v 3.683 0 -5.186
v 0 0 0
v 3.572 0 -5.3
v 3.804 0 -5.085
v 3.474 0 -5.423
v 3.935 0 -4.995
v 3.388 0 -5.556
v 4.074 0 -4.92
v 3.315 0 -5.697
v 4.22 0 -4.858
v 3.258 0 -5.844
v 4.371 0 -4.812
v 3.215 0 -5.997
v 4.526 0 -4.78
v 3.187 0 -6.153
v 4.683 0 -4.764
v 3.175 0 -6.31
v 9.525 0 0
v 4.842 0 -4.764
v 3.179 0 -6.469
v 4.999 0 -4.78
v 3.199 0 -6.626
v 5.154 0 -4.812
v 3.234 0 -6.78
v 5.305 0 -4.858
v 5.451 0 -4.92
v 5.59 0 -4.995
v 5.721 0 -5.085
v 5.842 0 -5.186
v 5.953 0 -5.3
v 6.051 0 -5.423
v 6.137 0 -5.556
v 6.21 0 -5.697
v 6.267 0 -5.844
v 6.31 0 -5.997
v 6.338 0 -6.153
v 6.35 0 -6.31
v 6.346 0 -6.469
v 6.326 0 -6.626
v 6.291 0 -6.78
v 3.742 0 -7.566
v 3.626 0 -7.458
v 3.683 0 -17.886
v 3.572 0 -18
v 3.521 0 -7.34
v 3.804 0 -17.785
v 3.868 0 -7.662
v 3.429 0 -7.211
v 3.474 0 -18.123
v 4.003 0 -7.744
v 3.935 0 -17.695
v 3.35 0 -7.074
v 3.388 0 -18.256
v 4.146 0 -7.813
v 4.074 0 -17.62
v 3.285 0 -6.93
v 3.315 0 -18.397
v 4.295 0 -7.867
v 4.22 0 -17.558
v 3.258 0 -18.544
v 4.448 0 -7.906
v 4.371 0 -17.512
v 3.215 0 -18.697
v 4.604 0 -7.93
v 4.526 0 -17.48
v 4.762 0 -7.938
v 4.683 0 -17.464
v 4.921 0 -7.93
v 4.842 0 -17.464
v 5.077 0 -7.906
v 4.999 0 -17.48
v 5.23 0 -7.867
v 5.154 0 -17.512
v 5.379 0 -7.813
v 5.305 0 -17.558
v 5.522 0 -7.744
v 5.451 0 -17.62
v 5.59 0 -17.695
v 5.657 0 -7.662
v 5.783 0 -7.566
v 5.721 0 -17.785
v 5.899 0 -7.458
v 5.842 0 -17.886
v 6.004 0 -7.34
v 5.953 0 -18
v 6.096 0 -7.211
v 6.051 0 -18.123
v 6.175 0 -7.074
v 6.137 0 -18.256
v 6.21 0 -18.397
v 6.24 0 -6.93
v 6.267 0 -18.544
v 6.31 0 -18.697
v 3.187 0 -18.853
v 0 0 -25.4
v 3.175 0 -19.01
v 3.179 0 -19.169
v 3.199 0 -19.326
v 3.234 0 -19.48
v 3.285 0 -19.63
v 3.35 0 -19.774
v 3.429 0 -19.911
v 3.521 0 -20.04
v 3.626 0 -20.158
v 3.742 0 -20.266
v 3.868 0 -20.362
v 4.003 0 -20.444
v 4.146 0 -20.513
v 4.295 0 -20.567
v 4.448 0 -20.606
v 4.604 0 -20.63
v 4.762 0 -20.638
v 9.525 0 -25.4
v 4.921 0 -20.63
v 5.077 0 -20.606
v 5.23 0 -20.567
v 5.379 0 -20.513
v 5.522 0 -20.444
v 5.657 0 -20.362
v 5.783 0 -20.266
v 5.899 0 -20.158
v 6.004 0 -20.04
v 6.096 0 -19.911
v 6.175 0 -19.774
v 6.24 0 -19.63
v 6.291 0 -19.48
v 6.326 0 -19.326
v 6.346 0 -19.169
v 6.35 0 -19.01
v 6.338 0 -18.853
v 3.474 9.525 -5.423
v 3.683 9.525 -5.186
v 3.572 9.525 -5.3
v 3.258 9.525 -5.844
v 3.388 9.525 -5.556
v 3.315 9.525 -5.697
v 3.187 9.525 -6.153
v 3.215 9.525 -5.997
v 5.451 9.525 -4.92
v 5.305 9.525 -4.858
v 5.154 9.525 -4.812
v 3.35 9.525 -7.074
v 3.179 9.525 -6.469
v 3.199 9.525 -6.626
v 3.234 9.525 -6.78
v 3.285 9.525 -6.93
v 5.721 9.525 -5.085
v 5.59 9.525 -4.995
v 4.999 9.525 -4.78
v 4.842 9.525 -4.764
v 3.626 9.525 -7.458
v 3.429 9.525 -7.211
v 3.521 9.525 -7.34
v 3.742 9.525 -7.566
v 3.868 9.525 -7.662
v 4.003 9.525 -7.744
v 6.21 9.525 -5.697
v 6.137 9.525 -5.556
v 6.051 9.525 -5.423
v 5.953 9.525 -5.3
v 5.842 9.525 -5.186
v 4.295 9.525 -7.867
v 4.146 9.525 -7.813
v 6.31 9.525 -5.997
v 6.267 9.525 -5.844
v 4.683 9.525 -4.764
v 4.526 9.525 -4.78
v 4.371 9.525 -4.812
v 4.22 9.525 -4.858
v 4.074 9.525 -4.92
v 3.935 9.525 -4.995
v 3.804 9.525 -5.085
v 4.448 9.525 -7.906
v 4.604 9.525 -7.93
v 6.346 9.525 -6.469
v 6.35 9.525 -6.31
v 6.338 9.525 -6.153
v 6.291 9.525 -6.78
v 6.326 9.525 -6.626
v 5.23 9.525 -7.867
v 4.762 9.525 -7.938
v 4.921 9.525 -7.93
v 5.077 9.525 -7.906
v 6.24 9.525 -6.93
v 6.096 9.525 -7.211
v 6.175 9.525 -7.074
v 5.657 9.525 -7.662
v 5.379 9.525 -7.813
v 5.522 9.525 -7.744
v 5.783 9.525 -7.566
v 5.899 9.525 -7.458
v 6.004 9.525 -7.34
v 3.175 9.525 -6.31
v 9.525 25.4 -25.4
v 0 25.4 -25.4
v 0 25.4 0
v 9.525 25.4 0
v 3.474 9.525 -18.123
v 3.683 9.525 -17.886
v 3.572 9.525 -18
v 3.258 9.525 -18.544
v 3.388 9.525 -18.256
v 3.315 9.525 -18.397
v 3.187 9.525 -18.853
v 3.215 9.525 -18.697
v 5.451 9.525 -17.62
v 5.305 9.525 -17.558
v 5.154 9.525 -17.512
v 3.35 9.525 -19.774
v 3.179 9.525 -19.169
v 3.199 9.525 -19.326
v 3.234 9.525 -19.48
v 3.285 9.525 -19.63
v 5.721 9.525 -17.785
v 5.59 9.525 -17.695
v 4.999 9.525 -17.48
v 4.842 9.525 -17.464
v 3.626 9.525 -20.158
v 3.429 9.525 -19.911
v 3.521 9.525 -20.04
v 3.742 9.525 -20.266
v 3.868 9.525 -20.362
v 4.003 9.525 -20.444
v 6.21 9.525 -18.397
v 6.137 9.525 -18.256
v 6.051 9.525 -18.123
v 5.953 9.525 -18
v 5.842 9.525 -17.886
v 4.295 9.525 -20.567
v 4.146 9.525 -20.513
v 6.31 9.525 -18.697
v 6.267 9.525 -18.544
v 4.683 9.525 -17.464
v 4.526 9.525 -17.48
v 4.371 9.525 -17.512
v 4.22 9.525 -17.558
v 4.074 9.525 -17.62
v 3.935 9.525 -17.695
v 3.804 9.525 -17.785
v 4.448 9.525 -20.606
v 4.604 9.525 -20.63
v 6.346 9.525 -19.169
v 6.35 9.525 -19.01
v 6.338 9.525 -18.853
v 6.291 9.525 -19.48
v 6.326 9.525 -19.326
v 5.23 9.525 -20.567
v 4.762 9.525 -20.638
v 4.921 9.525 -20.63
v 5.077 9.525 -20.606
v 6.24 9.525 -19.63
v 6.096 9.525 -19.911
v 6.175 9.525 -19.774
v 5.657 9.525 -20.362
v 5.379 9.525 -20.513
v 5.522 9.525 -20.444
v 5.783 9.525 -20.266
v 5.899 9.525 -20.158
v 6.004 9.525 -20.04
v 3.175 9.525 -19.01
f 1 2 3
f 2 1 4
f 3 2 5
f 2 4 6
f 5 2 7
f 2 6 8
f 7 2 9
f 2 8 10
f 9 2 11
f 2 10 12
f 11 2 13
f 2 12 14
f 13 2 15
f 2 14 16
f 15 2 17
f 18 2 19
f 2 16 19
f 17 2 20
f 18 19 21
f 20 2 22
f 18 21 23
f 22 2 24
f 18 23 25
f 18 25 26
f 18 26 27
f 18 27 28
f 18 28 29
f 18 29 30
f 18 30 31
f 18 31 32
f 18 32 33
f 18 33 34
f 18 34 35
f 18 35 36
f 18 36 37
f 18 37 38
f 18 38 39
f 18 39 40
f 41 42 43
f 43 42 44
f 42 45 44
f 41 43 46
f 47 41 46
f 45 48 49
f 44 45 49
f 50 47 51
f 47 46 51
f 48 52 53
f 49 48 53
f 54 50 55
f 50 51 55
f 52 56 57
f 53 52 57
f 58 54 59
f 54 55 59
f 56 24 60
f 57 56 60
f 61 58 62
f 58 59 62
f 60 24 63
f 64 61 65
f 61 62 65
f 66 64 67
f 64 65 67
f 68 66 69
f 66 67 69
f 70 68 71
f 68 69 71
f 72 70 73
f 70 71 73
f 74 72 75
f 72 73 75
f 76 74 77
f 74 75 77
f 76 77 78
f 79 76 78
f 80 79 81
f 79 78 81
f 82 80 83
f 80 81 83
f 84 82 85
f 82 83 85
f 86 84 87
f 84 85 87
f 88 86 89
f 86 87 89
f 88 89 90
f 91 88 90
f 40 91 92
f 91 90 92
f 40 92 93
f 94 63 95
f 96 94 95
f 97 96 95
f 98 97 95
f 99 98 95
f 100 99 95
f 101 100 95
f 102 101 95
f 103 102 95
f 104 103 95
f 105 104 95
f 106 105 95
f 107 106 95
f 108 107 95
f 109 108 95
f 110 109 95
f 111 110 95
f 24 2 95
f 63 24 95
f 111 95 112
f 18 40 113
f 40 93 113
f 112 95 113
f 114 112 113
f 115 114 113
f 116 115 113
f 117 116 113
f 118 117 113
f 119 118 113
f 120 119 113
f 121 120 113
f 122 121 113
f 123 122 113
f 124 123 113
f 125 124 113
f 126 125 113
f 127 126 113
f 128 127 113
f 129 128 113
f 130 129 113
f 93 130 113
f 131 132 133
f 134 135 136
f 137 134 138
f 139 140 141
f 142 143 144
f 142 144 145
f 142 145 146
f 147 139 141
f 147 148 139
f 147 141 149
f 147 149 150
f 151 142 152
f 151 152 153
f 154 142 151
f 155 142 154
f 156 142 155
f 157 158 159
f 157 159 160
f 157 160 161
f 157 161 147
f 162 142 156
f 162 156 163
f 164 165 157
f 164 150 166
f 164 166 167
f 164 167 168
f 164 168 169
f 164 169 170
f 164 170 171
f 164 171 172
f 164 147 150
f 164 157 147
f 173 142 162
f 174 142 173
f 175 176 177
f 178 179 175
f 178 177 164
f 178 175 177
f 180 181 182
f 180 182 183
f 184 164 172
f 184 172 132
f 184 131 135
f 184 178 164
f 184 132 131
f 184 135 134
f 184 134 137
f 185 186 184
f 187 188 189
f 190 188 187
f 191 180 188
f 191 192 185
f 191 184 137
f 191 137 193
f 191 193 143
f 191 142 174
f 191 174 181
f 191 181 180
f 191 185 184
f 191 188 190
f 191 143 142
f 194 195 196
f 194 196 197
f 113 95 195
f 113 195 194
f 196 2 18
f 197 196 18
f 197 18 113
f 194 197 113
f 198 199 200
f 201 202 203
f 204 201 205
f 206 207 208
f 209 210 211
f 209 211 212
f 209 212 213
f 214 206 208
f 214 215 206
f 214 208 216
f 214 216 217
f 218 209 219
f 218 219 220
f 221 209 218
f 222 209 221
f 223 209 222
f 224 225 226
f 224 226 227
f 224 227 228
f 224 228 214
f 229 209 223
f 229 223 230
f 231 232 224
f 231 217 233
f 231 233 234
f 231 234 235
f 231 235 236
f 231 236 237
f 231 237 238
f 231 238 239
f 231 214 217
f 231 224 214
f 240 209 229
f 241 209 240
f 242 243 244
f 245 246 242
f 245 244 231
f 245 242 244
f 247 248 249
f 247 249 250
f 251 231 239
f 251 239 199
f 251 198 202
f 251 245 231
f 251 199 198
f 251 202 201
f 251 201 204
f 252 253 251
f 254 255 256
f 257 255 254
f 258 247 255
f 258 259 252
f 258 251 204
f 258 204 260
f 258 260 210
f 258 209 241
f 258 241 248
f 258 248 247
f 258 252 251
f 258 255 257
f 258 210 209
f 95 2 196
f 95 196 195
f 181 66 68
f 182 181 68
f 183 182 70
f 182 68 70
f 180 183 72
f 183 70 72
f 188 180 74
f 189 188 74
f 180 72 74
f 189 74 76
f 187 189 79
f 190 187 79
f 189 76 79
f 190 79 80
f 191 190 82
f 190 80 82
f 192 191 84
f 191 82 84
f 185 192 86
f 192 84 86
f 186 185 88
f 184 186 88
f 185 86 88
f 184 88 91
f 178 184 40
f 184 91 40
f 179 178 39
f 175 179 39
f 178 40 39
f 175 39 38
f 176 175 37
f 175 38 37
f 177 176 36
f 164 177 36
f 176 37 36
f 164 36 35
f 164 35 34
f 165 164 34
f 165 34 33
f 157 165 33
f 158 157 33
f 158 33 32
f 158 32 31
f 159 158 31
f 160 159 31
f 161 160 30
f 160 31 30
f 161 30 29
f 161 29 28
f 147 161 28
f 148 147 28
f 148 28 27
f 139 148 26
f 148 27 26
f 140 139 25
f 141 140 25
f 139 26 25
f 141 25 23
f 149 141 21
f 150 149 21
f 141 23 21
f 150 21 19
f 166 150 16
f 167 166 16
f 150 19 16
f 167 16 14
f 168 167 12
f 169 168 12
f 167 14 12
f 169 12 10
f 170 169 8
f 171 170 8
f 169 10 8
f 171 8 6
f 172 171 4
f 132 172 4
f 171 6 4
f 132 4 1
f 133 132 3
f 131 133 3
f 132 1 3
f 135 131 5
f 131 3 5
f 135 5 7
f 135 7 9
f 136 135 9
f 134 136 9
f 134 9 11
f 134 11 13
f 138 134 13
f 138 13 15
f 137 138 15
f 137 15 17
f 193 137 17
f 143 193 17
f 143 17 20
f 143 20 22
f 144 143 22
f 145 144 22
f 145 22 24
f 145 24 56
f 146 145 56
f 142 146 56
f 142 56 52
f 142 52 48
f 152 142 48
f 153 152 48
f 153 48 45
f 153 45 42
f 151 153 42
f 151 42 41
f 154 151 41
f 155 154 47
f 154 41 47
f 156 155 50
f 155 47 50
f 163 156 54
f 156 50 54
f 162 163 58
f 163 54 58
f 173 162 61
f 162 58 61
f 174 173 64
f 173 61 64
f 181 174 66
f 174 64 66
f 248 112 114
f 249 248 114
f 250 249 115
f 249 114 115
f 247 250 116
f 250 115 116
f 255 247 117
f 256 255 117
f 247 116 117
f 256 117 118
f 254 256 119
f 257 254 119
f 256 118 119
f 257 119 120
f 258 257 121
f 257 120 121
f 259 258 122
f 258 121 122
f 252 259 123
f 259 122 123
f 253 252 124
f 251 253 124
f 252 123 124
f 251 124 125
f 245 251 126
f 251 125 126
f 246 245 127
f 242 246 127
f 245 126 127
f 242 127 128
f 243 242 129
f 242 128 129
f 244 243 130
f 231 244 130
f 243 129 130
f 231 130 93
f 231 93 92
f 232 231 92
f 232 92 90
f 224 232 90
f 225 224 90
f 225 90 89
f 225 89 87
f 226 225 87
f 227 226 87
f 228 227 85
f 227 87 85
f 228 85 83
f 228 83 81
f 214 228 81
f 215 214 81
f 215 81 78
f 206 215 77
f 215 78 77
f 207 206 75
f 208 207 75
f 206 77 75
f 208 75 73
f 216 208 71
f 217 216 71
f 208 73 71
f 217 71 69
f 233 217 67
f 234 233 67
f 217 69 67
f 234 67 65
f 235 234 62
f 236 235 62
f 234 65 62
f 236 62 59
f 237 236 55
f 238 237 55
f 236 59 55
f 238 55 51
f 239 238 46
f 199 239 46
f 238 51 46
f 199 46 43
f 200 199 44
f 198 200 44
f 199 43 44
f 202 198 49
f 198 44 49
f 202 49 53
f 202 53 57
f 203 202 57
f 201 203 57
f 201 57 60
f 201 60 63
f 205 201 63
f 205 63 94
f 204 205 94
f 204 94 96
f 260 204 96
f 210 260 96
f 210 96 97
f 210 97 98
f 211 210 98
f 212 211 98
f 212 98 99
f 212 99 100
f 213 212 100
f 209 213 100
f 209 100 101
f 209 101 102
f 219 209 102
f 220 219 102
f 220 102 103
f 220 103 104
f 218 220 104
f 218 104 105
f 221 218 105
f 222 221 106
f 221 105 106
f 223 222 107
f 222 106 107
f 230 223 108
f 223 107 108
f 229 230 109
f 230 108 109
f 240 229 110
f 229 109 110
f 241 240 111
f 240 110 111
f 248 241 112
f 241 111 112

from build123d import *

# Parameters (mm, degrees)
SKETCH1_W           = 9.525
SKETCH1_H           = 25.4
BOSS_EXTRUDE1_DEPTH = 25.4
SKETCH4_R           = 1.5875
CUT_EXTRUDE1_DEPTH  = 9.525


with BuildPart() as part:
    # Sketch1 → Boss-Extrude1 (new body)
    with BuildSketch(Plane(origin=(0, 0, 0), x_dir=(1, 0, 0), z_dir=(0, 1, 0))):
        with Locations((4.7625, 12.7)):
            Rectangle(SKETCH1_W, SKETCH1_H)
    extrude(amount=BOSS_EXTRUDE1_DEPTH)

    # Sketch4 → Cut-Extrude1 (cut)
    with BuildSketch(Plane.XZ):
        with Locations(Location((4.7625, -19.05, 0), (0, 0, 270))):
            Circle(SKETCH4_R)
        with Locations(Location((4.7625, -6.35, 0), (0, 0, 270))):
            Circle(SKETCH4_R)
    extrude(amount=-CUT_EXTRUDE1_DEPTH, mode=Mode.SUBTRACT)


solid = part.part
